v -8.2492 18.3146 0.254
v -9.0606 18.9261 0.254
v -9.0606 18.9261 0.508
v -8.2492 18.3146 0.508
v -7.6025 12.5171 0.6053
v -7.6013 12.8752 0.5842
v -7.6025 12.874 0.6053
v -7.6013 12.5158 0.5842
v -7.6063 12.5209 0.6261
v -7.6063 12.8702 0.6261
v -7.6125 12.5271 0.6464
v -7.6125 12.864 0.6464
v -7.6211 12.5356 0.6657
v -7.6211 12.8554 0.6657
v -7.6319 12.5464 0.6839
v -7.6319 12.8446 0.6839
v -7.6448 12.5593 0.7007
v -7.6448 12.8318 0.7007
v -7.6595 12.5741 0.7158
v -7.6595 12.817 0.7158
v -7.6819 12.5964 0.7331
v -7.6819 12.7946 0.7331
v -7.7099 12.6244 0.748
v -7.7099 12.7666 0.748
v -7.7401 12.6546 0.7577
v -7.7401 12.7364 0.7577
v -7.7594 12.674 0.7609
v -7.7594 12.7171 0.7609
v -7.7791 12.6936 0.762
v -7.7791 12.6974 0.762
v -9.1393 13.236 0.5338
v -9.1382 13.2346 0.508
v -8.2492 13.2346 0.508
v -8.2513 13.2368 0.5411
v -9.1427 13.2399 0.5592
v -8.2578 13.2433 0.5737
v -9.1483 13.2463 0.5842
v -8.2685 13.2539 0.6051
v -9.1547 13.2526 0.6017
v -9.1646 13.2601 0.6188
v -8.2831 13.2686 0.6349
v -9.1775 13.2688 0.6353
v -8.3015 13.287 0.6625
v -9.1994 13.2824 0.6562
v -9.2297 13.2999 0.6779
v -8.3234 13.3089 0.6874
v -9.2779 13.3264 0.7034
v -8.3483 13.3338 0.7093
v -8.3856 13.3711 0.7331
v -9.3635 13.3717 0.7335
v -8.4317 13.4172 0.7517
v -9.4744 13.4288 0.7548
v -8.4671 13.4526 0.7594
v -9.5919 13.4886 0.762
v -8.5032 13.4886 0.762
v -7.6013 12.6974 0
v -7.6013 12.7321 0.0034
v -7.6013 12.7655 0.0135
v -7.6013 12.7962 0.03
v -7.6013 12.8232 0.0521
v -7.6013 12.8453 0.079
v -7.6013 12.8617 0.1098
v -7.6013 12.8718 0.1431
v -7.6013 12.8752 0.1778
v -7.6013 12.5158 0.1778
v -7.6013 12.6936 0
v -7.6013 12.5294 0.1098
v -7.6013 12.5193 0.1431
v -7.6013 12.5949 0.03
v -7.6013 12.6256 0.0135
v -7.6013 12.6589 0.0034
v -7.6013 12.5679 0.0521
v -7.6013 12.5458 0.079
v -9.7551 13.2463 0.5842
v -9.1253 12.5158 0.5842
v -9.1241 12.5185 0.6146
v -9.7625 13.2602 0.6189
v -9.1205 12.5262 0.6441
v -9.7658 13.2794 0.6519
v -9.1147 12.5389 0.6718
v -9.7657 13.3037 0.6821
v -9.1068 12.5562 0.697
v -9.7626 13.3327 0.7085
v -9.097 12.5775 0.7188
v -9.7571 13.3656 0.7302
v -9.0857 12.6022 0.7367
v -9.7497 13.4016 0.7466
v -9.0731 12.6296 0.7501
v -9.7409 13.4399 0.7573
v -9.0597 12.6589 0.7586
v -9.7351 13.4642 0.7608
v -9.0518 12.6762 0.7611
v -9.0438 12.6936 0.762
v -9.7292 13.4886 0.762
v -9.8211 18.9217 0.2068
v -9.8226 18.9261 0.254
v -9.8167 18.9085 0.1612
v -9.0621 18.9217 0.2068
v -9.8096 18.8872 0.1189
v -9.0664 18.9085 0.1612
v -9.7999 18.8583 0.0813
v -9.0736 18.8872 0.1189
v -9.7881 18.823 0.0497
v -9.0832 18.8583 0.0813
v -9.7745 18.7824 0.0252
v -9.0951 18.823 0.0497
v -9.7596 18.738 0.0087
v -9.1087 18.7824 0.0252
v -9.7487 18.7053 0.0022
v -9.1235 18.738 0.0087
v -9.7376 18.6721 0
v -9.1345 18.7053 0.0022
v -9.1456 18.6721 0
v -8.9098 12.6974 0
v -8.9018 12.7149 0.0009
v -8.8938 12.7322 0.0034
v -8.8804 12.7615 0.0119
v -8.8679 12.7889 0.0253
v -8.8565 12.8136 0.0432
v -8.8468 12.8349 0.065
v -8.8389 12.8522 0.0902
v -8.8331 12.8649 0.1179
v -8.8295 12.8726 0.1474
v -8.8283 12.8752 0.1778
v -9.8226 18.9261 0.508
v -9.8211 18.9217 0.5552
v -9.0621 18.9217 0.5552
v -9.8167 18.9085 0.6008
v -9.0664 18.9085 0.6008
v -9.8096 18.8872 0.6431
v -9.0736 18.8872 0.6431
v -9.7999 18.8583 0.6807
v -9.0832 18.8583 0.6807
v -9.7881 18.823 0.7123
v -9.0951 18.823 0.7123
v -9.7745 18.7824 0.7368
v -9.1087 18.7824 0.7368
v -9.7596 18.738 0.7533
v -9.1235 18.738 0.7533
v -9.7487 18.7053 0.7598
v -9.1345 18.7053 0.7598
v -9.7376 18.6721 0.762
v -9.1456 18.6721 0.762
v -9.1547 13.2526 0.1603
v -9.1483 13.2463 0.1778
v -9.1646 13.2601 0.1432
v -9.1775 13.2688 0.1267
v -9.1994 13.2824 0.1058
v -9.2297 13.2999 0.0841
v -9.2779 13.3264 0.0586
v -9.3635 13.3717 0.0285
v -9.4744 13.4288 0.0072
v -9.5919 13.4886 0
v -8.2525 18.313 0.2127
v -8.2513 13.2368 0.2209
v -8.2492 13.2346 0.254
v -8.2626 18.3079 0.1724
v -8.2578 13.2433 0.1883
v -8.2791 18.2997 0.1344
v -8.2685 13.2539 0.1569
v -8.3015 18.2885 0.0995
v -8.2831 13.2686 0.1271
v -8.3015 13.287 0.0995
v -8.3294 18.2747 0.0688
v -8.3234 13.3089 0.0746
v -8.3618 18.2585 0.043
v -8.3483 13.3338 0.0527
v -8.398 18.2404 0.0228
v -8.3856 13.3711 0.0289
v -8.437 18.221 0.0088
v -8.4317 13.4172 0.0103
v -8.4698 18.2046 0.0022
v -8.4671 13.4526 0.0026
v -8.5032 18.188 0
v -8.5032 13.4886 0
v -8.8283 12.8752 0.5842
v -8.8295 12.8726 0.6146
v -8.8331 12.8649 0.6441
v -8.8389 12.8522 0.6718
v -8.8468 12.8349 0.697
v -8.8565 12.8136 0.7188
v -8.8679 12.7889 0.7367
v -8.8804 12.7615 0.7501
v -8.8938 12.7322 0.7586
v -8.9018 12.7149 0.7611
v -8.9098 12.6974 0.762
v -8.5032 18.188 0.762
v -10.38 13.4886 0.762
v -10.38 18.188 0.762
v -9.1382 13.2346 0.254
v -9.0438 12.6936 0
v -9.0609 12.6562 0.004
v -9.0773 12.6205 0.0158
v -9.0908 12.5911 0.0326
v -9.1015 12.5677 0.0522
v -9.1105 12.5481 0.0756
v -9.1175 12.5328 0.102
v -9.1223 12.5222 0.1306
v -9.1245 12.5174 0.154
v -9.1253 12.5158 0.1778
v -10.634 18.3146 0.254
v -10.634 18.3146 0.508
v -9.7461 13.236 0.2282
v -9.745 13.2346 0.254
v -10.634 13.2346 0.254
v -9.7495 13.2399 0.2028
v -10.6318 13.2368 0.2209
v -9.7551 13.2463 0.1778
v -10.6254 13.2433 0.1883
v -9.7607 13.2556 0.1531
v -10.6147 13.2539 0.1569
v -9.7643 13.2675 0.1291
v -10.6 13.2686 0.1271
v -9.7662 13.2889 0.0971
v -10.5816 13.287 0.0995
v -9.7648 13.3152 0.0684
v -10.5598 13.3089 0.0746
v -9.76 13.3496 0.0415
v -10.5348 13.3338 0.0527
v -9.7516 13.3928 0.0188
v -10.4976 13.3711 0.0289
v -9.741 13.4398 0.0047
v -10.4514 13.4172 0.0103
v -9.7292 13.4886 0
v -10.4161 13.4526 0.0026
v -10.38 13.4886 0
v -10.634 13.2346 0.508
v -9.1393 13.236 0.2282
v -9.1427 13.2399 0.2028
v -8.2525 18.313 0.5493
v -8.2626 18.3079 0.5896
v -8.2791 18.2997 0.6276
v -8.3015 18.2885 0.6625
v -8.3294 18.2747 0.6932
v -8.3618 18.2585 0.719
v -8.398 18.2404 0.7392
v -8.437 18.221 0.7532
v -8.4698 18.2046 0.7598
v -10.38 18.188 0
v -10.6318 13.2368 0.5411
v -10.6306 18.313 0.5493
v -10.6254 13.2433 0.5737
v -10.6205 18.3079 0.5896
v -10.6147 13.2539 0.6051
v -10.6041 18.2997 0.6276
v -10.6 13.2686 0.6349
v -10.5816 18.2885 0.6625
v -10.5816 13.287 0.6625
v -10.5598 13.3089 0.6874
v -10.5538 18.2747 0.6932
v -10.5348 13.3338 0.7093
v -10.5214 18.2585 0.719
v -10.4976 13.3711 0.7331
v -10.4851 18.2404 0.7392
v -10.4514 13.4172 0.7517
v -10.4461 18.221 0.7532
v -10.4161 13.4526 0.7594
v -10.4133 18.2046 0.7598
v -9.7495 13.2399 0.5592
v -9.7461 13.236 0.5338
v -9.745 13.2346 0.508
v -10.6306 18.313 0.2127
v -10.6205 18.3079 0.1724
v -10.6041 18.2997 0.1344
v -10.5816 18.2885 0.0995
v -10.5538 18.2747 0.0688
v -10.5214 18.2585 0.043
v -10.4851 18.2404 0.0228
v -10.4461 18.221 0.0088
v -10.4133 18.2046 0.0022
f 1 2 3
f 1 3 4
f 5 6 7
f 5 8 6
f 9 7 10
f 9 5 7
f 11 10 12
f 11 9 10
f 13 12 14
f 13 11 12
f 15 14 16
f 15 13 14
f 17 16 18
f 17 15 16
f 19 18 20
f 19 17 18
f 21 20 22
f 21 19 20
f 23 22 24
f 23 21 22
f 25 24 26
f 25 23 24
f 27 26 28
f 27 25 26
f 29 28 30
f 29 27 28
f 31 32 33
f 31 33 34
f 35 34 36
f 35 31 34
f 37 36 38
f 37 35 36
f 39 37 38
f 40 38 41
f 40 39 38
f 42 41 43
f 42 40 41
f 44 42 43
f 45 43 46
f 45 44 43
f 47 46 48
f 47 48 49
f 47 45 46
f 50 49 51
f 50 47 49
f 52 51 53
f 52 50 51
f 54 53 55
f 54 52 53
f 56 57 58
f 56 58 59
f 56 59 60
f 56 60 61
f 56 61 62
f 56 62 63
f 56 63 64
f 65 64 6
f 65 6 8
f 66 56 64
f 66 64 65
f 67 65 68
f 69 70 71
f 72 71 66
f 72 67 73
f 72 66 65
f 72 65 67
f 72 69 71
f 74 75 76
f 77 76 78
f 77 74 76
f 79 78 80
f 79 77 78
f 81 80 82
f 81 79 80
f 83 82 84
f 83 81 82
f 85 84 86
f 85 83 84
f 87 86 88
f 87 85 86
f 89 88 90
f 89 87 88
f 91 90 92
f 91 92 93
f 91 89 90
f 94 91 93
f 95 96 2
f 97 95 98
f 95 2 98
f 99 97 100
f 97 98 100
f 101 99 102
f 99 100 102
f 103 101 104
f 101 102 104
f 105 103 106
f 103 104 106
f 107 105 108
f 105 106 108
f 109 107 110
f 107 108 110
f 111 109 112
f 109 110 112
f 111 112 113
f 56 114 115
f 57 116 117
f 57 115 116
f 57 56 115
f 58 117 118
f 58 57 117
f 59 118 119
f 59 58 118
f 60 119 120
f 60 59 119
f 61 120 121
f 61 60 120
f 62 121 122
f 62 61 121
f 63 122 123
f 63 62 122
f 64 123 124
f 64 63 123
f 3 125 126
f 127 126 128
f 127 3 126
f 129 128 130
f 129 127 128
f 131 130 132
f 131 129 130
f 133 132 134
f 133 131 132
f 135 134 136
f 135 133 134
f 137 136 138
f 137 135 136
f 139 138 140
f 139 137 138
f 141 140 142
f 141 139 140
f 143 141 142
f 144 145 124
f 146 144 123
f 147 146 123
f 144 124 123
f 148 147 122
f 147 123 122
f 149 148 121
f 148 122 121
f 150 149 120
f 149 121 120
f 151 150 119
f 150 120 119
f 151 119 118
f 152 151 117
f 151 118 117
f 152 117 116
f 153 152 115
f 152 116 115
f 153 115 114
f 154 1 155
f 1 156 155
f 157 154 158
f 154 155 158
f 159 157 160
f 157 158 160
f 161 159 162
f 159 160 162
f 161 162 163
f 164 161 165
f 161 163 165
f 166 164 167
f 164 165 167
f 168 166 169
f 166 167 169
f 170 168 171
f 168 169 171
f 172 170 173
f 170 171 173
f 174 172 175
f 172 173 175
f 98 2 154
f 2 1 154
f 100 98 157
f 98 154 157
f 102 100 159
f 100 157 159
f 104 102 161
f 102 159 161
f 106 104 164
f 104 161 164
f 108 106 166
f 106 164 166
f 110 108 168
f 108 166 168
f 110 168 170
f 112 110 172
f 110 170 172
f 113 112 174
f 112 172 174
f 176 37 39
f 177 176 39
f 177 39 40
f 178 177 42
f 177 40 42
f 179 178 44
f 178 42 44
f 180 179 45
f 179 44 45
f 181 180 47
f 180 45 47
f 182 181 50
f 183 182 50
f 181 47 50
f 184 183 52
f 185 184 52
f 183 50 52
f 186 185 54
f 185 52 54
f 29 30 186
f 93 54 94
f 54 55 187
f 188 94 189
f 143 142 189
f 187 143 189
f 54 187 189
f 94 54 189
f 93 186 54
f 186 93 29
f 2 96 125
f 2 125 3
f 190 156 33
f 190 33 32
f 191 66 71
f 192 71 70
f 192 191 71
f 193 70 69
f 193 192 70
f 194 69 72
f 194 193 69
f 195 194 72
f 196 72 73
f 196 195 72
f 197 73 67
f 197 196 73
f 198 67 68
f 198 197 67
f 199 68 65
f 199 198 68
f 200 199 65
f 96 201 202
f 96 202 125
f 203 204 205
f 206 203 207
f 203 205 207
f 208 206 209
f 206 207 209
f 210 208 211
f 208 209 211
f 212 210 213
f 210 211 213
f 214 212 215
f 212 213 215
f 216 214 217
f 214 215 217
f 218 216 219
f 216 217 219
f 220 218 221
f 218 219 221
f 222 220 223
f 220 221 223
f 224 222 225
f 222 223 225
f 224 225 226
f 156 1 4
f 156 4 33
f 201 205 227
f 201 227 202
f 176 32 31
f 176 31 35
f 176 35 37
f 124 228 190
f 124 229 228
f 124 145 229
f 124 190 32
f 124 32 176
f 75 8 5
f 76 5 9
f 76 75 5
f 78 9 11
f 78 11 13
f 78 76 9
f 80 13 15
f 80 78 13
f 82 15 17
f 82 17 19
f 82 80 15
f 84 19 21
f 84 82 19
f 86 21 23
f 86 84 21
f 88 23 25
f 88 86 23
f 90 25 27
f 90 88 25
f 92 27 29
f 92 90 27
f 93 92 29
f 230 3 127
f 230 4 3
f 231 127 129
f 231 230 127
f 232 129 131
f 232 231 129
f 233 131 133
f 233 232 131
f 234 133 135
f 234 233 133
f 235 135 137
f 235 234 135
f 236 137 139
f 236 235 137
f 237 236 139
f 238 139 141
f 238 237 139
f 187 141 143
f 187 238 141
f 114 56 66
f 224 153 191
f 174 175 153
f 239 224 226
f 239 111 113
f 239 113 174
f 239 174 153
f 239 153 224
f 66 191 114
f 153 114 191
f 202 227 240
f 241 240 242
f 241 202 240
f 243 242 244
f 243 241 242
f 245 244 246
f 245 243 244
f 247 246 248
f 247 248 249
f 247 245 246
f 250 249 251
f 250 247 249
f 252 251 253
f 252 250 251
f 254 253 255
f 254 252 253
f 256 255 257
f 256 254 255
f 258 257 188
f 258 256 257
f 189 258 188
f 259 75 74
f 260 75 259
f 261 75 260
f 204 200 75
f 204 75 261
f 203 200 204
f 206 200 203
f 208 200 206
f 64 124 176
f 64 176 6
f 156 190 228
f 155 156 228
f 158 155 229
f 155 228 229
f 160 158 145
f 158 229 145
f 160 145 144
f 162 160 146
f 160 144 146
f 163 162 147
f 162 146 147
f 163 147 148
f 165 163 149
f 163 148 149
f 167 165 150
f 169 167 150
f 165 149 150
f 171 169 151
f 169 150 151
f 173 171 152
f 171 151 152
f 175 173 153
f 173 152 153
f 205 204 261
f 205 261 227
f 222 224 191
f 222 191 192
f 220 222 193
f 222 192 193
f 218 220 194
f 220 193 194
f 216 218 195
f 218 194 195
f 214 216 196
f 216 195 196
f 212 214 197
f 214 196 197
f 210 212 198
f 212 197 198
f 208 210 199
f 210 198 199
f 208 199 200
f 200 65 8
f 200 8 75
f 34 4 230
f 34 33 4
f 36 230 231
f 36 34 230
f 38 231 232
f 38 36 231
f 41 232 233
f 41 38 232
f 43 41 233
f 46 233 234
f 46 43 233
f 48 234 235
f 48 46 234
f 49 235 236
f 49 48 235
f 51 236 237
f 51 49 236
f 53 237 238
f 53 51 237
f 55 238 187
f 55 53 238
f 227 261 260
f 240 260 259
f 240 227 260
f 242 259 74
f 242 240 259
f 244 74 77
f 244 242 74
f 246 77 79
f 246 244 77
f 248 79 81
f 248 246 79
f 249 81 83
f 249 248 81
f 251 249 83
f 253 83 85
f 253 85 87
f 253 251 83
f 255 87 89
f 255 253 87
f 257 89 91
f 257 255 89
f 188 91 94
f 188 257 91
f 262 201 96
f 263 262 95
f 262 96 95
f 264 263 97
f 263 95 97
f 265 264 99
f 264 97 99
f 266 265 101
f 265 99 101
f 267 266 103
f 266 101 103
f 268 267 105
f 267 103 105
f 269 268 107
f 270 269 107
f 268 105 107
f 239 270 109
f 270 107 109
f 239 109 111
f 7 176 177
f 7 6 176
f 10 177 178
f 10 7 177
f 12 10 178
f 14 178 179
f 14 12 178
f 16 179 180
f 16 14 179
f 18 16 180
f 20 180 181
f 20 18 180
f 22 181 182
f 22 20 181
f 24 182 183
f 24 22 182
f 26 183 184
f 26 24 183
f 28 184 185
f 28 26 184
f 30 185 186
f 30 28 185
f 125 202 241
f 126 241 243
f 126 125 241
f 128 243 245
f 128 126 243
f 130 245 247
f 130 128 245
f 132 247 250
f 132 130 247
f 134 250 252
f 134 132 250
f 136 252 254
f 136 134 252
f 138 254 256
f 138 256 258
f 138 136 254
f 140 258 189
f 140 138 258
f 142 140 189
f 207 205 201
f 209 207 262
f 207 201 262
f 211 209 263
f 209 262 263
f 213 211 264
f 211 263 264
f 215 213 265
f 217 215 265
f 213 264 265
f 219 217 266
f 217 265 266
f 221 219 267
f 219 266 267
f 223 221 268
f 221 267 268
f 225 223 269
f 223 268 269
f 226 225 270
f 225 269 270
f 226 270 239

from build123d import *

# Parameters (mm, degrees)
BOSS_EXTRUDE1_DEPTH = 0.762
FILLET6_R           = 0.254
FILLET7_R           = 0.1778


with BuildPart() as part:
    # Sketch1 → Boss-Extrude1 (new body)
    with BuildSketch(Plane.XY):
        Polygon((-10.633992105, 13.234648789), (-10.633992105, 18.314648789), (-9.822578427, 18.926092853), (-9.060578427, 18.926092853), (-8.249164748, 18.314648789), (-8.249164748, 13.234648789), (-9.138164748, 13.234648789), (-8.828298732, 12.875241629), (-7.601260072, 12.875241629), (-7.601260072, 12.515834468), (-9.125260072, 12.515834468), (-9.744992105, 13.234648789), align=None)
    extrude(amount=BOSS_EXTRUDE1_DEPTH)

    # Fillet6
    fillet6_edges = [part.edges().sort_by_distance(p)[0] for p in [
        (-8.693664748, 13.234648789, 0.762),
        (-10.189492105, 13.234648789, 0),
        (-10.633992105, 15.774648789, 0),
        (-10.228285266, 18.620370821, 0),
        (-9.441578427, 18.926092853, 0),
        (-8.654871588, 18.620370821, 0),
        (-8.249164748, 15.774648789, 0),
        (-8.693664748, 13.234648789, 0),
        (-8.249164748, 15.774648789, 0.762),
        (-8.654871588, 18.620370821, 0.762),
        (-9.441578427, 18.926092853, 0.762),
        (-10.228285266, 18.620370821, 0.762),
        (-10.633992105, 15.774648789, 0.762),
        (-10.189492105, 13.234648789, 0.762),
    ]]
    fillet(fillet6_edges, radius=FILLET6_R)

    # Fillet7
    fillet7_edges = [part.edges().sort_by_distance(p)[0] for p in [
        (-8.363260072, 12.515834468, 0),
        (-9.435126088, 12.875241629, 0),
        (-8.98323174, 13.054945209, 0),
        (-8.214779402, 12.875241629, 0),
        (-7.601260072, 12.695538049, 0.762),
        (-8.363260072, 12.515834468, 0.762),
        (-9.435126088, 12.875241629, 0.762),
        (-8.214779402, 12.875241629, 0.762),
        (-8.98323174, 13.054945209, 0.762),
    ]]
    fillet(fillet7_edges, radius=FILLET7_R)


solid = part.part
